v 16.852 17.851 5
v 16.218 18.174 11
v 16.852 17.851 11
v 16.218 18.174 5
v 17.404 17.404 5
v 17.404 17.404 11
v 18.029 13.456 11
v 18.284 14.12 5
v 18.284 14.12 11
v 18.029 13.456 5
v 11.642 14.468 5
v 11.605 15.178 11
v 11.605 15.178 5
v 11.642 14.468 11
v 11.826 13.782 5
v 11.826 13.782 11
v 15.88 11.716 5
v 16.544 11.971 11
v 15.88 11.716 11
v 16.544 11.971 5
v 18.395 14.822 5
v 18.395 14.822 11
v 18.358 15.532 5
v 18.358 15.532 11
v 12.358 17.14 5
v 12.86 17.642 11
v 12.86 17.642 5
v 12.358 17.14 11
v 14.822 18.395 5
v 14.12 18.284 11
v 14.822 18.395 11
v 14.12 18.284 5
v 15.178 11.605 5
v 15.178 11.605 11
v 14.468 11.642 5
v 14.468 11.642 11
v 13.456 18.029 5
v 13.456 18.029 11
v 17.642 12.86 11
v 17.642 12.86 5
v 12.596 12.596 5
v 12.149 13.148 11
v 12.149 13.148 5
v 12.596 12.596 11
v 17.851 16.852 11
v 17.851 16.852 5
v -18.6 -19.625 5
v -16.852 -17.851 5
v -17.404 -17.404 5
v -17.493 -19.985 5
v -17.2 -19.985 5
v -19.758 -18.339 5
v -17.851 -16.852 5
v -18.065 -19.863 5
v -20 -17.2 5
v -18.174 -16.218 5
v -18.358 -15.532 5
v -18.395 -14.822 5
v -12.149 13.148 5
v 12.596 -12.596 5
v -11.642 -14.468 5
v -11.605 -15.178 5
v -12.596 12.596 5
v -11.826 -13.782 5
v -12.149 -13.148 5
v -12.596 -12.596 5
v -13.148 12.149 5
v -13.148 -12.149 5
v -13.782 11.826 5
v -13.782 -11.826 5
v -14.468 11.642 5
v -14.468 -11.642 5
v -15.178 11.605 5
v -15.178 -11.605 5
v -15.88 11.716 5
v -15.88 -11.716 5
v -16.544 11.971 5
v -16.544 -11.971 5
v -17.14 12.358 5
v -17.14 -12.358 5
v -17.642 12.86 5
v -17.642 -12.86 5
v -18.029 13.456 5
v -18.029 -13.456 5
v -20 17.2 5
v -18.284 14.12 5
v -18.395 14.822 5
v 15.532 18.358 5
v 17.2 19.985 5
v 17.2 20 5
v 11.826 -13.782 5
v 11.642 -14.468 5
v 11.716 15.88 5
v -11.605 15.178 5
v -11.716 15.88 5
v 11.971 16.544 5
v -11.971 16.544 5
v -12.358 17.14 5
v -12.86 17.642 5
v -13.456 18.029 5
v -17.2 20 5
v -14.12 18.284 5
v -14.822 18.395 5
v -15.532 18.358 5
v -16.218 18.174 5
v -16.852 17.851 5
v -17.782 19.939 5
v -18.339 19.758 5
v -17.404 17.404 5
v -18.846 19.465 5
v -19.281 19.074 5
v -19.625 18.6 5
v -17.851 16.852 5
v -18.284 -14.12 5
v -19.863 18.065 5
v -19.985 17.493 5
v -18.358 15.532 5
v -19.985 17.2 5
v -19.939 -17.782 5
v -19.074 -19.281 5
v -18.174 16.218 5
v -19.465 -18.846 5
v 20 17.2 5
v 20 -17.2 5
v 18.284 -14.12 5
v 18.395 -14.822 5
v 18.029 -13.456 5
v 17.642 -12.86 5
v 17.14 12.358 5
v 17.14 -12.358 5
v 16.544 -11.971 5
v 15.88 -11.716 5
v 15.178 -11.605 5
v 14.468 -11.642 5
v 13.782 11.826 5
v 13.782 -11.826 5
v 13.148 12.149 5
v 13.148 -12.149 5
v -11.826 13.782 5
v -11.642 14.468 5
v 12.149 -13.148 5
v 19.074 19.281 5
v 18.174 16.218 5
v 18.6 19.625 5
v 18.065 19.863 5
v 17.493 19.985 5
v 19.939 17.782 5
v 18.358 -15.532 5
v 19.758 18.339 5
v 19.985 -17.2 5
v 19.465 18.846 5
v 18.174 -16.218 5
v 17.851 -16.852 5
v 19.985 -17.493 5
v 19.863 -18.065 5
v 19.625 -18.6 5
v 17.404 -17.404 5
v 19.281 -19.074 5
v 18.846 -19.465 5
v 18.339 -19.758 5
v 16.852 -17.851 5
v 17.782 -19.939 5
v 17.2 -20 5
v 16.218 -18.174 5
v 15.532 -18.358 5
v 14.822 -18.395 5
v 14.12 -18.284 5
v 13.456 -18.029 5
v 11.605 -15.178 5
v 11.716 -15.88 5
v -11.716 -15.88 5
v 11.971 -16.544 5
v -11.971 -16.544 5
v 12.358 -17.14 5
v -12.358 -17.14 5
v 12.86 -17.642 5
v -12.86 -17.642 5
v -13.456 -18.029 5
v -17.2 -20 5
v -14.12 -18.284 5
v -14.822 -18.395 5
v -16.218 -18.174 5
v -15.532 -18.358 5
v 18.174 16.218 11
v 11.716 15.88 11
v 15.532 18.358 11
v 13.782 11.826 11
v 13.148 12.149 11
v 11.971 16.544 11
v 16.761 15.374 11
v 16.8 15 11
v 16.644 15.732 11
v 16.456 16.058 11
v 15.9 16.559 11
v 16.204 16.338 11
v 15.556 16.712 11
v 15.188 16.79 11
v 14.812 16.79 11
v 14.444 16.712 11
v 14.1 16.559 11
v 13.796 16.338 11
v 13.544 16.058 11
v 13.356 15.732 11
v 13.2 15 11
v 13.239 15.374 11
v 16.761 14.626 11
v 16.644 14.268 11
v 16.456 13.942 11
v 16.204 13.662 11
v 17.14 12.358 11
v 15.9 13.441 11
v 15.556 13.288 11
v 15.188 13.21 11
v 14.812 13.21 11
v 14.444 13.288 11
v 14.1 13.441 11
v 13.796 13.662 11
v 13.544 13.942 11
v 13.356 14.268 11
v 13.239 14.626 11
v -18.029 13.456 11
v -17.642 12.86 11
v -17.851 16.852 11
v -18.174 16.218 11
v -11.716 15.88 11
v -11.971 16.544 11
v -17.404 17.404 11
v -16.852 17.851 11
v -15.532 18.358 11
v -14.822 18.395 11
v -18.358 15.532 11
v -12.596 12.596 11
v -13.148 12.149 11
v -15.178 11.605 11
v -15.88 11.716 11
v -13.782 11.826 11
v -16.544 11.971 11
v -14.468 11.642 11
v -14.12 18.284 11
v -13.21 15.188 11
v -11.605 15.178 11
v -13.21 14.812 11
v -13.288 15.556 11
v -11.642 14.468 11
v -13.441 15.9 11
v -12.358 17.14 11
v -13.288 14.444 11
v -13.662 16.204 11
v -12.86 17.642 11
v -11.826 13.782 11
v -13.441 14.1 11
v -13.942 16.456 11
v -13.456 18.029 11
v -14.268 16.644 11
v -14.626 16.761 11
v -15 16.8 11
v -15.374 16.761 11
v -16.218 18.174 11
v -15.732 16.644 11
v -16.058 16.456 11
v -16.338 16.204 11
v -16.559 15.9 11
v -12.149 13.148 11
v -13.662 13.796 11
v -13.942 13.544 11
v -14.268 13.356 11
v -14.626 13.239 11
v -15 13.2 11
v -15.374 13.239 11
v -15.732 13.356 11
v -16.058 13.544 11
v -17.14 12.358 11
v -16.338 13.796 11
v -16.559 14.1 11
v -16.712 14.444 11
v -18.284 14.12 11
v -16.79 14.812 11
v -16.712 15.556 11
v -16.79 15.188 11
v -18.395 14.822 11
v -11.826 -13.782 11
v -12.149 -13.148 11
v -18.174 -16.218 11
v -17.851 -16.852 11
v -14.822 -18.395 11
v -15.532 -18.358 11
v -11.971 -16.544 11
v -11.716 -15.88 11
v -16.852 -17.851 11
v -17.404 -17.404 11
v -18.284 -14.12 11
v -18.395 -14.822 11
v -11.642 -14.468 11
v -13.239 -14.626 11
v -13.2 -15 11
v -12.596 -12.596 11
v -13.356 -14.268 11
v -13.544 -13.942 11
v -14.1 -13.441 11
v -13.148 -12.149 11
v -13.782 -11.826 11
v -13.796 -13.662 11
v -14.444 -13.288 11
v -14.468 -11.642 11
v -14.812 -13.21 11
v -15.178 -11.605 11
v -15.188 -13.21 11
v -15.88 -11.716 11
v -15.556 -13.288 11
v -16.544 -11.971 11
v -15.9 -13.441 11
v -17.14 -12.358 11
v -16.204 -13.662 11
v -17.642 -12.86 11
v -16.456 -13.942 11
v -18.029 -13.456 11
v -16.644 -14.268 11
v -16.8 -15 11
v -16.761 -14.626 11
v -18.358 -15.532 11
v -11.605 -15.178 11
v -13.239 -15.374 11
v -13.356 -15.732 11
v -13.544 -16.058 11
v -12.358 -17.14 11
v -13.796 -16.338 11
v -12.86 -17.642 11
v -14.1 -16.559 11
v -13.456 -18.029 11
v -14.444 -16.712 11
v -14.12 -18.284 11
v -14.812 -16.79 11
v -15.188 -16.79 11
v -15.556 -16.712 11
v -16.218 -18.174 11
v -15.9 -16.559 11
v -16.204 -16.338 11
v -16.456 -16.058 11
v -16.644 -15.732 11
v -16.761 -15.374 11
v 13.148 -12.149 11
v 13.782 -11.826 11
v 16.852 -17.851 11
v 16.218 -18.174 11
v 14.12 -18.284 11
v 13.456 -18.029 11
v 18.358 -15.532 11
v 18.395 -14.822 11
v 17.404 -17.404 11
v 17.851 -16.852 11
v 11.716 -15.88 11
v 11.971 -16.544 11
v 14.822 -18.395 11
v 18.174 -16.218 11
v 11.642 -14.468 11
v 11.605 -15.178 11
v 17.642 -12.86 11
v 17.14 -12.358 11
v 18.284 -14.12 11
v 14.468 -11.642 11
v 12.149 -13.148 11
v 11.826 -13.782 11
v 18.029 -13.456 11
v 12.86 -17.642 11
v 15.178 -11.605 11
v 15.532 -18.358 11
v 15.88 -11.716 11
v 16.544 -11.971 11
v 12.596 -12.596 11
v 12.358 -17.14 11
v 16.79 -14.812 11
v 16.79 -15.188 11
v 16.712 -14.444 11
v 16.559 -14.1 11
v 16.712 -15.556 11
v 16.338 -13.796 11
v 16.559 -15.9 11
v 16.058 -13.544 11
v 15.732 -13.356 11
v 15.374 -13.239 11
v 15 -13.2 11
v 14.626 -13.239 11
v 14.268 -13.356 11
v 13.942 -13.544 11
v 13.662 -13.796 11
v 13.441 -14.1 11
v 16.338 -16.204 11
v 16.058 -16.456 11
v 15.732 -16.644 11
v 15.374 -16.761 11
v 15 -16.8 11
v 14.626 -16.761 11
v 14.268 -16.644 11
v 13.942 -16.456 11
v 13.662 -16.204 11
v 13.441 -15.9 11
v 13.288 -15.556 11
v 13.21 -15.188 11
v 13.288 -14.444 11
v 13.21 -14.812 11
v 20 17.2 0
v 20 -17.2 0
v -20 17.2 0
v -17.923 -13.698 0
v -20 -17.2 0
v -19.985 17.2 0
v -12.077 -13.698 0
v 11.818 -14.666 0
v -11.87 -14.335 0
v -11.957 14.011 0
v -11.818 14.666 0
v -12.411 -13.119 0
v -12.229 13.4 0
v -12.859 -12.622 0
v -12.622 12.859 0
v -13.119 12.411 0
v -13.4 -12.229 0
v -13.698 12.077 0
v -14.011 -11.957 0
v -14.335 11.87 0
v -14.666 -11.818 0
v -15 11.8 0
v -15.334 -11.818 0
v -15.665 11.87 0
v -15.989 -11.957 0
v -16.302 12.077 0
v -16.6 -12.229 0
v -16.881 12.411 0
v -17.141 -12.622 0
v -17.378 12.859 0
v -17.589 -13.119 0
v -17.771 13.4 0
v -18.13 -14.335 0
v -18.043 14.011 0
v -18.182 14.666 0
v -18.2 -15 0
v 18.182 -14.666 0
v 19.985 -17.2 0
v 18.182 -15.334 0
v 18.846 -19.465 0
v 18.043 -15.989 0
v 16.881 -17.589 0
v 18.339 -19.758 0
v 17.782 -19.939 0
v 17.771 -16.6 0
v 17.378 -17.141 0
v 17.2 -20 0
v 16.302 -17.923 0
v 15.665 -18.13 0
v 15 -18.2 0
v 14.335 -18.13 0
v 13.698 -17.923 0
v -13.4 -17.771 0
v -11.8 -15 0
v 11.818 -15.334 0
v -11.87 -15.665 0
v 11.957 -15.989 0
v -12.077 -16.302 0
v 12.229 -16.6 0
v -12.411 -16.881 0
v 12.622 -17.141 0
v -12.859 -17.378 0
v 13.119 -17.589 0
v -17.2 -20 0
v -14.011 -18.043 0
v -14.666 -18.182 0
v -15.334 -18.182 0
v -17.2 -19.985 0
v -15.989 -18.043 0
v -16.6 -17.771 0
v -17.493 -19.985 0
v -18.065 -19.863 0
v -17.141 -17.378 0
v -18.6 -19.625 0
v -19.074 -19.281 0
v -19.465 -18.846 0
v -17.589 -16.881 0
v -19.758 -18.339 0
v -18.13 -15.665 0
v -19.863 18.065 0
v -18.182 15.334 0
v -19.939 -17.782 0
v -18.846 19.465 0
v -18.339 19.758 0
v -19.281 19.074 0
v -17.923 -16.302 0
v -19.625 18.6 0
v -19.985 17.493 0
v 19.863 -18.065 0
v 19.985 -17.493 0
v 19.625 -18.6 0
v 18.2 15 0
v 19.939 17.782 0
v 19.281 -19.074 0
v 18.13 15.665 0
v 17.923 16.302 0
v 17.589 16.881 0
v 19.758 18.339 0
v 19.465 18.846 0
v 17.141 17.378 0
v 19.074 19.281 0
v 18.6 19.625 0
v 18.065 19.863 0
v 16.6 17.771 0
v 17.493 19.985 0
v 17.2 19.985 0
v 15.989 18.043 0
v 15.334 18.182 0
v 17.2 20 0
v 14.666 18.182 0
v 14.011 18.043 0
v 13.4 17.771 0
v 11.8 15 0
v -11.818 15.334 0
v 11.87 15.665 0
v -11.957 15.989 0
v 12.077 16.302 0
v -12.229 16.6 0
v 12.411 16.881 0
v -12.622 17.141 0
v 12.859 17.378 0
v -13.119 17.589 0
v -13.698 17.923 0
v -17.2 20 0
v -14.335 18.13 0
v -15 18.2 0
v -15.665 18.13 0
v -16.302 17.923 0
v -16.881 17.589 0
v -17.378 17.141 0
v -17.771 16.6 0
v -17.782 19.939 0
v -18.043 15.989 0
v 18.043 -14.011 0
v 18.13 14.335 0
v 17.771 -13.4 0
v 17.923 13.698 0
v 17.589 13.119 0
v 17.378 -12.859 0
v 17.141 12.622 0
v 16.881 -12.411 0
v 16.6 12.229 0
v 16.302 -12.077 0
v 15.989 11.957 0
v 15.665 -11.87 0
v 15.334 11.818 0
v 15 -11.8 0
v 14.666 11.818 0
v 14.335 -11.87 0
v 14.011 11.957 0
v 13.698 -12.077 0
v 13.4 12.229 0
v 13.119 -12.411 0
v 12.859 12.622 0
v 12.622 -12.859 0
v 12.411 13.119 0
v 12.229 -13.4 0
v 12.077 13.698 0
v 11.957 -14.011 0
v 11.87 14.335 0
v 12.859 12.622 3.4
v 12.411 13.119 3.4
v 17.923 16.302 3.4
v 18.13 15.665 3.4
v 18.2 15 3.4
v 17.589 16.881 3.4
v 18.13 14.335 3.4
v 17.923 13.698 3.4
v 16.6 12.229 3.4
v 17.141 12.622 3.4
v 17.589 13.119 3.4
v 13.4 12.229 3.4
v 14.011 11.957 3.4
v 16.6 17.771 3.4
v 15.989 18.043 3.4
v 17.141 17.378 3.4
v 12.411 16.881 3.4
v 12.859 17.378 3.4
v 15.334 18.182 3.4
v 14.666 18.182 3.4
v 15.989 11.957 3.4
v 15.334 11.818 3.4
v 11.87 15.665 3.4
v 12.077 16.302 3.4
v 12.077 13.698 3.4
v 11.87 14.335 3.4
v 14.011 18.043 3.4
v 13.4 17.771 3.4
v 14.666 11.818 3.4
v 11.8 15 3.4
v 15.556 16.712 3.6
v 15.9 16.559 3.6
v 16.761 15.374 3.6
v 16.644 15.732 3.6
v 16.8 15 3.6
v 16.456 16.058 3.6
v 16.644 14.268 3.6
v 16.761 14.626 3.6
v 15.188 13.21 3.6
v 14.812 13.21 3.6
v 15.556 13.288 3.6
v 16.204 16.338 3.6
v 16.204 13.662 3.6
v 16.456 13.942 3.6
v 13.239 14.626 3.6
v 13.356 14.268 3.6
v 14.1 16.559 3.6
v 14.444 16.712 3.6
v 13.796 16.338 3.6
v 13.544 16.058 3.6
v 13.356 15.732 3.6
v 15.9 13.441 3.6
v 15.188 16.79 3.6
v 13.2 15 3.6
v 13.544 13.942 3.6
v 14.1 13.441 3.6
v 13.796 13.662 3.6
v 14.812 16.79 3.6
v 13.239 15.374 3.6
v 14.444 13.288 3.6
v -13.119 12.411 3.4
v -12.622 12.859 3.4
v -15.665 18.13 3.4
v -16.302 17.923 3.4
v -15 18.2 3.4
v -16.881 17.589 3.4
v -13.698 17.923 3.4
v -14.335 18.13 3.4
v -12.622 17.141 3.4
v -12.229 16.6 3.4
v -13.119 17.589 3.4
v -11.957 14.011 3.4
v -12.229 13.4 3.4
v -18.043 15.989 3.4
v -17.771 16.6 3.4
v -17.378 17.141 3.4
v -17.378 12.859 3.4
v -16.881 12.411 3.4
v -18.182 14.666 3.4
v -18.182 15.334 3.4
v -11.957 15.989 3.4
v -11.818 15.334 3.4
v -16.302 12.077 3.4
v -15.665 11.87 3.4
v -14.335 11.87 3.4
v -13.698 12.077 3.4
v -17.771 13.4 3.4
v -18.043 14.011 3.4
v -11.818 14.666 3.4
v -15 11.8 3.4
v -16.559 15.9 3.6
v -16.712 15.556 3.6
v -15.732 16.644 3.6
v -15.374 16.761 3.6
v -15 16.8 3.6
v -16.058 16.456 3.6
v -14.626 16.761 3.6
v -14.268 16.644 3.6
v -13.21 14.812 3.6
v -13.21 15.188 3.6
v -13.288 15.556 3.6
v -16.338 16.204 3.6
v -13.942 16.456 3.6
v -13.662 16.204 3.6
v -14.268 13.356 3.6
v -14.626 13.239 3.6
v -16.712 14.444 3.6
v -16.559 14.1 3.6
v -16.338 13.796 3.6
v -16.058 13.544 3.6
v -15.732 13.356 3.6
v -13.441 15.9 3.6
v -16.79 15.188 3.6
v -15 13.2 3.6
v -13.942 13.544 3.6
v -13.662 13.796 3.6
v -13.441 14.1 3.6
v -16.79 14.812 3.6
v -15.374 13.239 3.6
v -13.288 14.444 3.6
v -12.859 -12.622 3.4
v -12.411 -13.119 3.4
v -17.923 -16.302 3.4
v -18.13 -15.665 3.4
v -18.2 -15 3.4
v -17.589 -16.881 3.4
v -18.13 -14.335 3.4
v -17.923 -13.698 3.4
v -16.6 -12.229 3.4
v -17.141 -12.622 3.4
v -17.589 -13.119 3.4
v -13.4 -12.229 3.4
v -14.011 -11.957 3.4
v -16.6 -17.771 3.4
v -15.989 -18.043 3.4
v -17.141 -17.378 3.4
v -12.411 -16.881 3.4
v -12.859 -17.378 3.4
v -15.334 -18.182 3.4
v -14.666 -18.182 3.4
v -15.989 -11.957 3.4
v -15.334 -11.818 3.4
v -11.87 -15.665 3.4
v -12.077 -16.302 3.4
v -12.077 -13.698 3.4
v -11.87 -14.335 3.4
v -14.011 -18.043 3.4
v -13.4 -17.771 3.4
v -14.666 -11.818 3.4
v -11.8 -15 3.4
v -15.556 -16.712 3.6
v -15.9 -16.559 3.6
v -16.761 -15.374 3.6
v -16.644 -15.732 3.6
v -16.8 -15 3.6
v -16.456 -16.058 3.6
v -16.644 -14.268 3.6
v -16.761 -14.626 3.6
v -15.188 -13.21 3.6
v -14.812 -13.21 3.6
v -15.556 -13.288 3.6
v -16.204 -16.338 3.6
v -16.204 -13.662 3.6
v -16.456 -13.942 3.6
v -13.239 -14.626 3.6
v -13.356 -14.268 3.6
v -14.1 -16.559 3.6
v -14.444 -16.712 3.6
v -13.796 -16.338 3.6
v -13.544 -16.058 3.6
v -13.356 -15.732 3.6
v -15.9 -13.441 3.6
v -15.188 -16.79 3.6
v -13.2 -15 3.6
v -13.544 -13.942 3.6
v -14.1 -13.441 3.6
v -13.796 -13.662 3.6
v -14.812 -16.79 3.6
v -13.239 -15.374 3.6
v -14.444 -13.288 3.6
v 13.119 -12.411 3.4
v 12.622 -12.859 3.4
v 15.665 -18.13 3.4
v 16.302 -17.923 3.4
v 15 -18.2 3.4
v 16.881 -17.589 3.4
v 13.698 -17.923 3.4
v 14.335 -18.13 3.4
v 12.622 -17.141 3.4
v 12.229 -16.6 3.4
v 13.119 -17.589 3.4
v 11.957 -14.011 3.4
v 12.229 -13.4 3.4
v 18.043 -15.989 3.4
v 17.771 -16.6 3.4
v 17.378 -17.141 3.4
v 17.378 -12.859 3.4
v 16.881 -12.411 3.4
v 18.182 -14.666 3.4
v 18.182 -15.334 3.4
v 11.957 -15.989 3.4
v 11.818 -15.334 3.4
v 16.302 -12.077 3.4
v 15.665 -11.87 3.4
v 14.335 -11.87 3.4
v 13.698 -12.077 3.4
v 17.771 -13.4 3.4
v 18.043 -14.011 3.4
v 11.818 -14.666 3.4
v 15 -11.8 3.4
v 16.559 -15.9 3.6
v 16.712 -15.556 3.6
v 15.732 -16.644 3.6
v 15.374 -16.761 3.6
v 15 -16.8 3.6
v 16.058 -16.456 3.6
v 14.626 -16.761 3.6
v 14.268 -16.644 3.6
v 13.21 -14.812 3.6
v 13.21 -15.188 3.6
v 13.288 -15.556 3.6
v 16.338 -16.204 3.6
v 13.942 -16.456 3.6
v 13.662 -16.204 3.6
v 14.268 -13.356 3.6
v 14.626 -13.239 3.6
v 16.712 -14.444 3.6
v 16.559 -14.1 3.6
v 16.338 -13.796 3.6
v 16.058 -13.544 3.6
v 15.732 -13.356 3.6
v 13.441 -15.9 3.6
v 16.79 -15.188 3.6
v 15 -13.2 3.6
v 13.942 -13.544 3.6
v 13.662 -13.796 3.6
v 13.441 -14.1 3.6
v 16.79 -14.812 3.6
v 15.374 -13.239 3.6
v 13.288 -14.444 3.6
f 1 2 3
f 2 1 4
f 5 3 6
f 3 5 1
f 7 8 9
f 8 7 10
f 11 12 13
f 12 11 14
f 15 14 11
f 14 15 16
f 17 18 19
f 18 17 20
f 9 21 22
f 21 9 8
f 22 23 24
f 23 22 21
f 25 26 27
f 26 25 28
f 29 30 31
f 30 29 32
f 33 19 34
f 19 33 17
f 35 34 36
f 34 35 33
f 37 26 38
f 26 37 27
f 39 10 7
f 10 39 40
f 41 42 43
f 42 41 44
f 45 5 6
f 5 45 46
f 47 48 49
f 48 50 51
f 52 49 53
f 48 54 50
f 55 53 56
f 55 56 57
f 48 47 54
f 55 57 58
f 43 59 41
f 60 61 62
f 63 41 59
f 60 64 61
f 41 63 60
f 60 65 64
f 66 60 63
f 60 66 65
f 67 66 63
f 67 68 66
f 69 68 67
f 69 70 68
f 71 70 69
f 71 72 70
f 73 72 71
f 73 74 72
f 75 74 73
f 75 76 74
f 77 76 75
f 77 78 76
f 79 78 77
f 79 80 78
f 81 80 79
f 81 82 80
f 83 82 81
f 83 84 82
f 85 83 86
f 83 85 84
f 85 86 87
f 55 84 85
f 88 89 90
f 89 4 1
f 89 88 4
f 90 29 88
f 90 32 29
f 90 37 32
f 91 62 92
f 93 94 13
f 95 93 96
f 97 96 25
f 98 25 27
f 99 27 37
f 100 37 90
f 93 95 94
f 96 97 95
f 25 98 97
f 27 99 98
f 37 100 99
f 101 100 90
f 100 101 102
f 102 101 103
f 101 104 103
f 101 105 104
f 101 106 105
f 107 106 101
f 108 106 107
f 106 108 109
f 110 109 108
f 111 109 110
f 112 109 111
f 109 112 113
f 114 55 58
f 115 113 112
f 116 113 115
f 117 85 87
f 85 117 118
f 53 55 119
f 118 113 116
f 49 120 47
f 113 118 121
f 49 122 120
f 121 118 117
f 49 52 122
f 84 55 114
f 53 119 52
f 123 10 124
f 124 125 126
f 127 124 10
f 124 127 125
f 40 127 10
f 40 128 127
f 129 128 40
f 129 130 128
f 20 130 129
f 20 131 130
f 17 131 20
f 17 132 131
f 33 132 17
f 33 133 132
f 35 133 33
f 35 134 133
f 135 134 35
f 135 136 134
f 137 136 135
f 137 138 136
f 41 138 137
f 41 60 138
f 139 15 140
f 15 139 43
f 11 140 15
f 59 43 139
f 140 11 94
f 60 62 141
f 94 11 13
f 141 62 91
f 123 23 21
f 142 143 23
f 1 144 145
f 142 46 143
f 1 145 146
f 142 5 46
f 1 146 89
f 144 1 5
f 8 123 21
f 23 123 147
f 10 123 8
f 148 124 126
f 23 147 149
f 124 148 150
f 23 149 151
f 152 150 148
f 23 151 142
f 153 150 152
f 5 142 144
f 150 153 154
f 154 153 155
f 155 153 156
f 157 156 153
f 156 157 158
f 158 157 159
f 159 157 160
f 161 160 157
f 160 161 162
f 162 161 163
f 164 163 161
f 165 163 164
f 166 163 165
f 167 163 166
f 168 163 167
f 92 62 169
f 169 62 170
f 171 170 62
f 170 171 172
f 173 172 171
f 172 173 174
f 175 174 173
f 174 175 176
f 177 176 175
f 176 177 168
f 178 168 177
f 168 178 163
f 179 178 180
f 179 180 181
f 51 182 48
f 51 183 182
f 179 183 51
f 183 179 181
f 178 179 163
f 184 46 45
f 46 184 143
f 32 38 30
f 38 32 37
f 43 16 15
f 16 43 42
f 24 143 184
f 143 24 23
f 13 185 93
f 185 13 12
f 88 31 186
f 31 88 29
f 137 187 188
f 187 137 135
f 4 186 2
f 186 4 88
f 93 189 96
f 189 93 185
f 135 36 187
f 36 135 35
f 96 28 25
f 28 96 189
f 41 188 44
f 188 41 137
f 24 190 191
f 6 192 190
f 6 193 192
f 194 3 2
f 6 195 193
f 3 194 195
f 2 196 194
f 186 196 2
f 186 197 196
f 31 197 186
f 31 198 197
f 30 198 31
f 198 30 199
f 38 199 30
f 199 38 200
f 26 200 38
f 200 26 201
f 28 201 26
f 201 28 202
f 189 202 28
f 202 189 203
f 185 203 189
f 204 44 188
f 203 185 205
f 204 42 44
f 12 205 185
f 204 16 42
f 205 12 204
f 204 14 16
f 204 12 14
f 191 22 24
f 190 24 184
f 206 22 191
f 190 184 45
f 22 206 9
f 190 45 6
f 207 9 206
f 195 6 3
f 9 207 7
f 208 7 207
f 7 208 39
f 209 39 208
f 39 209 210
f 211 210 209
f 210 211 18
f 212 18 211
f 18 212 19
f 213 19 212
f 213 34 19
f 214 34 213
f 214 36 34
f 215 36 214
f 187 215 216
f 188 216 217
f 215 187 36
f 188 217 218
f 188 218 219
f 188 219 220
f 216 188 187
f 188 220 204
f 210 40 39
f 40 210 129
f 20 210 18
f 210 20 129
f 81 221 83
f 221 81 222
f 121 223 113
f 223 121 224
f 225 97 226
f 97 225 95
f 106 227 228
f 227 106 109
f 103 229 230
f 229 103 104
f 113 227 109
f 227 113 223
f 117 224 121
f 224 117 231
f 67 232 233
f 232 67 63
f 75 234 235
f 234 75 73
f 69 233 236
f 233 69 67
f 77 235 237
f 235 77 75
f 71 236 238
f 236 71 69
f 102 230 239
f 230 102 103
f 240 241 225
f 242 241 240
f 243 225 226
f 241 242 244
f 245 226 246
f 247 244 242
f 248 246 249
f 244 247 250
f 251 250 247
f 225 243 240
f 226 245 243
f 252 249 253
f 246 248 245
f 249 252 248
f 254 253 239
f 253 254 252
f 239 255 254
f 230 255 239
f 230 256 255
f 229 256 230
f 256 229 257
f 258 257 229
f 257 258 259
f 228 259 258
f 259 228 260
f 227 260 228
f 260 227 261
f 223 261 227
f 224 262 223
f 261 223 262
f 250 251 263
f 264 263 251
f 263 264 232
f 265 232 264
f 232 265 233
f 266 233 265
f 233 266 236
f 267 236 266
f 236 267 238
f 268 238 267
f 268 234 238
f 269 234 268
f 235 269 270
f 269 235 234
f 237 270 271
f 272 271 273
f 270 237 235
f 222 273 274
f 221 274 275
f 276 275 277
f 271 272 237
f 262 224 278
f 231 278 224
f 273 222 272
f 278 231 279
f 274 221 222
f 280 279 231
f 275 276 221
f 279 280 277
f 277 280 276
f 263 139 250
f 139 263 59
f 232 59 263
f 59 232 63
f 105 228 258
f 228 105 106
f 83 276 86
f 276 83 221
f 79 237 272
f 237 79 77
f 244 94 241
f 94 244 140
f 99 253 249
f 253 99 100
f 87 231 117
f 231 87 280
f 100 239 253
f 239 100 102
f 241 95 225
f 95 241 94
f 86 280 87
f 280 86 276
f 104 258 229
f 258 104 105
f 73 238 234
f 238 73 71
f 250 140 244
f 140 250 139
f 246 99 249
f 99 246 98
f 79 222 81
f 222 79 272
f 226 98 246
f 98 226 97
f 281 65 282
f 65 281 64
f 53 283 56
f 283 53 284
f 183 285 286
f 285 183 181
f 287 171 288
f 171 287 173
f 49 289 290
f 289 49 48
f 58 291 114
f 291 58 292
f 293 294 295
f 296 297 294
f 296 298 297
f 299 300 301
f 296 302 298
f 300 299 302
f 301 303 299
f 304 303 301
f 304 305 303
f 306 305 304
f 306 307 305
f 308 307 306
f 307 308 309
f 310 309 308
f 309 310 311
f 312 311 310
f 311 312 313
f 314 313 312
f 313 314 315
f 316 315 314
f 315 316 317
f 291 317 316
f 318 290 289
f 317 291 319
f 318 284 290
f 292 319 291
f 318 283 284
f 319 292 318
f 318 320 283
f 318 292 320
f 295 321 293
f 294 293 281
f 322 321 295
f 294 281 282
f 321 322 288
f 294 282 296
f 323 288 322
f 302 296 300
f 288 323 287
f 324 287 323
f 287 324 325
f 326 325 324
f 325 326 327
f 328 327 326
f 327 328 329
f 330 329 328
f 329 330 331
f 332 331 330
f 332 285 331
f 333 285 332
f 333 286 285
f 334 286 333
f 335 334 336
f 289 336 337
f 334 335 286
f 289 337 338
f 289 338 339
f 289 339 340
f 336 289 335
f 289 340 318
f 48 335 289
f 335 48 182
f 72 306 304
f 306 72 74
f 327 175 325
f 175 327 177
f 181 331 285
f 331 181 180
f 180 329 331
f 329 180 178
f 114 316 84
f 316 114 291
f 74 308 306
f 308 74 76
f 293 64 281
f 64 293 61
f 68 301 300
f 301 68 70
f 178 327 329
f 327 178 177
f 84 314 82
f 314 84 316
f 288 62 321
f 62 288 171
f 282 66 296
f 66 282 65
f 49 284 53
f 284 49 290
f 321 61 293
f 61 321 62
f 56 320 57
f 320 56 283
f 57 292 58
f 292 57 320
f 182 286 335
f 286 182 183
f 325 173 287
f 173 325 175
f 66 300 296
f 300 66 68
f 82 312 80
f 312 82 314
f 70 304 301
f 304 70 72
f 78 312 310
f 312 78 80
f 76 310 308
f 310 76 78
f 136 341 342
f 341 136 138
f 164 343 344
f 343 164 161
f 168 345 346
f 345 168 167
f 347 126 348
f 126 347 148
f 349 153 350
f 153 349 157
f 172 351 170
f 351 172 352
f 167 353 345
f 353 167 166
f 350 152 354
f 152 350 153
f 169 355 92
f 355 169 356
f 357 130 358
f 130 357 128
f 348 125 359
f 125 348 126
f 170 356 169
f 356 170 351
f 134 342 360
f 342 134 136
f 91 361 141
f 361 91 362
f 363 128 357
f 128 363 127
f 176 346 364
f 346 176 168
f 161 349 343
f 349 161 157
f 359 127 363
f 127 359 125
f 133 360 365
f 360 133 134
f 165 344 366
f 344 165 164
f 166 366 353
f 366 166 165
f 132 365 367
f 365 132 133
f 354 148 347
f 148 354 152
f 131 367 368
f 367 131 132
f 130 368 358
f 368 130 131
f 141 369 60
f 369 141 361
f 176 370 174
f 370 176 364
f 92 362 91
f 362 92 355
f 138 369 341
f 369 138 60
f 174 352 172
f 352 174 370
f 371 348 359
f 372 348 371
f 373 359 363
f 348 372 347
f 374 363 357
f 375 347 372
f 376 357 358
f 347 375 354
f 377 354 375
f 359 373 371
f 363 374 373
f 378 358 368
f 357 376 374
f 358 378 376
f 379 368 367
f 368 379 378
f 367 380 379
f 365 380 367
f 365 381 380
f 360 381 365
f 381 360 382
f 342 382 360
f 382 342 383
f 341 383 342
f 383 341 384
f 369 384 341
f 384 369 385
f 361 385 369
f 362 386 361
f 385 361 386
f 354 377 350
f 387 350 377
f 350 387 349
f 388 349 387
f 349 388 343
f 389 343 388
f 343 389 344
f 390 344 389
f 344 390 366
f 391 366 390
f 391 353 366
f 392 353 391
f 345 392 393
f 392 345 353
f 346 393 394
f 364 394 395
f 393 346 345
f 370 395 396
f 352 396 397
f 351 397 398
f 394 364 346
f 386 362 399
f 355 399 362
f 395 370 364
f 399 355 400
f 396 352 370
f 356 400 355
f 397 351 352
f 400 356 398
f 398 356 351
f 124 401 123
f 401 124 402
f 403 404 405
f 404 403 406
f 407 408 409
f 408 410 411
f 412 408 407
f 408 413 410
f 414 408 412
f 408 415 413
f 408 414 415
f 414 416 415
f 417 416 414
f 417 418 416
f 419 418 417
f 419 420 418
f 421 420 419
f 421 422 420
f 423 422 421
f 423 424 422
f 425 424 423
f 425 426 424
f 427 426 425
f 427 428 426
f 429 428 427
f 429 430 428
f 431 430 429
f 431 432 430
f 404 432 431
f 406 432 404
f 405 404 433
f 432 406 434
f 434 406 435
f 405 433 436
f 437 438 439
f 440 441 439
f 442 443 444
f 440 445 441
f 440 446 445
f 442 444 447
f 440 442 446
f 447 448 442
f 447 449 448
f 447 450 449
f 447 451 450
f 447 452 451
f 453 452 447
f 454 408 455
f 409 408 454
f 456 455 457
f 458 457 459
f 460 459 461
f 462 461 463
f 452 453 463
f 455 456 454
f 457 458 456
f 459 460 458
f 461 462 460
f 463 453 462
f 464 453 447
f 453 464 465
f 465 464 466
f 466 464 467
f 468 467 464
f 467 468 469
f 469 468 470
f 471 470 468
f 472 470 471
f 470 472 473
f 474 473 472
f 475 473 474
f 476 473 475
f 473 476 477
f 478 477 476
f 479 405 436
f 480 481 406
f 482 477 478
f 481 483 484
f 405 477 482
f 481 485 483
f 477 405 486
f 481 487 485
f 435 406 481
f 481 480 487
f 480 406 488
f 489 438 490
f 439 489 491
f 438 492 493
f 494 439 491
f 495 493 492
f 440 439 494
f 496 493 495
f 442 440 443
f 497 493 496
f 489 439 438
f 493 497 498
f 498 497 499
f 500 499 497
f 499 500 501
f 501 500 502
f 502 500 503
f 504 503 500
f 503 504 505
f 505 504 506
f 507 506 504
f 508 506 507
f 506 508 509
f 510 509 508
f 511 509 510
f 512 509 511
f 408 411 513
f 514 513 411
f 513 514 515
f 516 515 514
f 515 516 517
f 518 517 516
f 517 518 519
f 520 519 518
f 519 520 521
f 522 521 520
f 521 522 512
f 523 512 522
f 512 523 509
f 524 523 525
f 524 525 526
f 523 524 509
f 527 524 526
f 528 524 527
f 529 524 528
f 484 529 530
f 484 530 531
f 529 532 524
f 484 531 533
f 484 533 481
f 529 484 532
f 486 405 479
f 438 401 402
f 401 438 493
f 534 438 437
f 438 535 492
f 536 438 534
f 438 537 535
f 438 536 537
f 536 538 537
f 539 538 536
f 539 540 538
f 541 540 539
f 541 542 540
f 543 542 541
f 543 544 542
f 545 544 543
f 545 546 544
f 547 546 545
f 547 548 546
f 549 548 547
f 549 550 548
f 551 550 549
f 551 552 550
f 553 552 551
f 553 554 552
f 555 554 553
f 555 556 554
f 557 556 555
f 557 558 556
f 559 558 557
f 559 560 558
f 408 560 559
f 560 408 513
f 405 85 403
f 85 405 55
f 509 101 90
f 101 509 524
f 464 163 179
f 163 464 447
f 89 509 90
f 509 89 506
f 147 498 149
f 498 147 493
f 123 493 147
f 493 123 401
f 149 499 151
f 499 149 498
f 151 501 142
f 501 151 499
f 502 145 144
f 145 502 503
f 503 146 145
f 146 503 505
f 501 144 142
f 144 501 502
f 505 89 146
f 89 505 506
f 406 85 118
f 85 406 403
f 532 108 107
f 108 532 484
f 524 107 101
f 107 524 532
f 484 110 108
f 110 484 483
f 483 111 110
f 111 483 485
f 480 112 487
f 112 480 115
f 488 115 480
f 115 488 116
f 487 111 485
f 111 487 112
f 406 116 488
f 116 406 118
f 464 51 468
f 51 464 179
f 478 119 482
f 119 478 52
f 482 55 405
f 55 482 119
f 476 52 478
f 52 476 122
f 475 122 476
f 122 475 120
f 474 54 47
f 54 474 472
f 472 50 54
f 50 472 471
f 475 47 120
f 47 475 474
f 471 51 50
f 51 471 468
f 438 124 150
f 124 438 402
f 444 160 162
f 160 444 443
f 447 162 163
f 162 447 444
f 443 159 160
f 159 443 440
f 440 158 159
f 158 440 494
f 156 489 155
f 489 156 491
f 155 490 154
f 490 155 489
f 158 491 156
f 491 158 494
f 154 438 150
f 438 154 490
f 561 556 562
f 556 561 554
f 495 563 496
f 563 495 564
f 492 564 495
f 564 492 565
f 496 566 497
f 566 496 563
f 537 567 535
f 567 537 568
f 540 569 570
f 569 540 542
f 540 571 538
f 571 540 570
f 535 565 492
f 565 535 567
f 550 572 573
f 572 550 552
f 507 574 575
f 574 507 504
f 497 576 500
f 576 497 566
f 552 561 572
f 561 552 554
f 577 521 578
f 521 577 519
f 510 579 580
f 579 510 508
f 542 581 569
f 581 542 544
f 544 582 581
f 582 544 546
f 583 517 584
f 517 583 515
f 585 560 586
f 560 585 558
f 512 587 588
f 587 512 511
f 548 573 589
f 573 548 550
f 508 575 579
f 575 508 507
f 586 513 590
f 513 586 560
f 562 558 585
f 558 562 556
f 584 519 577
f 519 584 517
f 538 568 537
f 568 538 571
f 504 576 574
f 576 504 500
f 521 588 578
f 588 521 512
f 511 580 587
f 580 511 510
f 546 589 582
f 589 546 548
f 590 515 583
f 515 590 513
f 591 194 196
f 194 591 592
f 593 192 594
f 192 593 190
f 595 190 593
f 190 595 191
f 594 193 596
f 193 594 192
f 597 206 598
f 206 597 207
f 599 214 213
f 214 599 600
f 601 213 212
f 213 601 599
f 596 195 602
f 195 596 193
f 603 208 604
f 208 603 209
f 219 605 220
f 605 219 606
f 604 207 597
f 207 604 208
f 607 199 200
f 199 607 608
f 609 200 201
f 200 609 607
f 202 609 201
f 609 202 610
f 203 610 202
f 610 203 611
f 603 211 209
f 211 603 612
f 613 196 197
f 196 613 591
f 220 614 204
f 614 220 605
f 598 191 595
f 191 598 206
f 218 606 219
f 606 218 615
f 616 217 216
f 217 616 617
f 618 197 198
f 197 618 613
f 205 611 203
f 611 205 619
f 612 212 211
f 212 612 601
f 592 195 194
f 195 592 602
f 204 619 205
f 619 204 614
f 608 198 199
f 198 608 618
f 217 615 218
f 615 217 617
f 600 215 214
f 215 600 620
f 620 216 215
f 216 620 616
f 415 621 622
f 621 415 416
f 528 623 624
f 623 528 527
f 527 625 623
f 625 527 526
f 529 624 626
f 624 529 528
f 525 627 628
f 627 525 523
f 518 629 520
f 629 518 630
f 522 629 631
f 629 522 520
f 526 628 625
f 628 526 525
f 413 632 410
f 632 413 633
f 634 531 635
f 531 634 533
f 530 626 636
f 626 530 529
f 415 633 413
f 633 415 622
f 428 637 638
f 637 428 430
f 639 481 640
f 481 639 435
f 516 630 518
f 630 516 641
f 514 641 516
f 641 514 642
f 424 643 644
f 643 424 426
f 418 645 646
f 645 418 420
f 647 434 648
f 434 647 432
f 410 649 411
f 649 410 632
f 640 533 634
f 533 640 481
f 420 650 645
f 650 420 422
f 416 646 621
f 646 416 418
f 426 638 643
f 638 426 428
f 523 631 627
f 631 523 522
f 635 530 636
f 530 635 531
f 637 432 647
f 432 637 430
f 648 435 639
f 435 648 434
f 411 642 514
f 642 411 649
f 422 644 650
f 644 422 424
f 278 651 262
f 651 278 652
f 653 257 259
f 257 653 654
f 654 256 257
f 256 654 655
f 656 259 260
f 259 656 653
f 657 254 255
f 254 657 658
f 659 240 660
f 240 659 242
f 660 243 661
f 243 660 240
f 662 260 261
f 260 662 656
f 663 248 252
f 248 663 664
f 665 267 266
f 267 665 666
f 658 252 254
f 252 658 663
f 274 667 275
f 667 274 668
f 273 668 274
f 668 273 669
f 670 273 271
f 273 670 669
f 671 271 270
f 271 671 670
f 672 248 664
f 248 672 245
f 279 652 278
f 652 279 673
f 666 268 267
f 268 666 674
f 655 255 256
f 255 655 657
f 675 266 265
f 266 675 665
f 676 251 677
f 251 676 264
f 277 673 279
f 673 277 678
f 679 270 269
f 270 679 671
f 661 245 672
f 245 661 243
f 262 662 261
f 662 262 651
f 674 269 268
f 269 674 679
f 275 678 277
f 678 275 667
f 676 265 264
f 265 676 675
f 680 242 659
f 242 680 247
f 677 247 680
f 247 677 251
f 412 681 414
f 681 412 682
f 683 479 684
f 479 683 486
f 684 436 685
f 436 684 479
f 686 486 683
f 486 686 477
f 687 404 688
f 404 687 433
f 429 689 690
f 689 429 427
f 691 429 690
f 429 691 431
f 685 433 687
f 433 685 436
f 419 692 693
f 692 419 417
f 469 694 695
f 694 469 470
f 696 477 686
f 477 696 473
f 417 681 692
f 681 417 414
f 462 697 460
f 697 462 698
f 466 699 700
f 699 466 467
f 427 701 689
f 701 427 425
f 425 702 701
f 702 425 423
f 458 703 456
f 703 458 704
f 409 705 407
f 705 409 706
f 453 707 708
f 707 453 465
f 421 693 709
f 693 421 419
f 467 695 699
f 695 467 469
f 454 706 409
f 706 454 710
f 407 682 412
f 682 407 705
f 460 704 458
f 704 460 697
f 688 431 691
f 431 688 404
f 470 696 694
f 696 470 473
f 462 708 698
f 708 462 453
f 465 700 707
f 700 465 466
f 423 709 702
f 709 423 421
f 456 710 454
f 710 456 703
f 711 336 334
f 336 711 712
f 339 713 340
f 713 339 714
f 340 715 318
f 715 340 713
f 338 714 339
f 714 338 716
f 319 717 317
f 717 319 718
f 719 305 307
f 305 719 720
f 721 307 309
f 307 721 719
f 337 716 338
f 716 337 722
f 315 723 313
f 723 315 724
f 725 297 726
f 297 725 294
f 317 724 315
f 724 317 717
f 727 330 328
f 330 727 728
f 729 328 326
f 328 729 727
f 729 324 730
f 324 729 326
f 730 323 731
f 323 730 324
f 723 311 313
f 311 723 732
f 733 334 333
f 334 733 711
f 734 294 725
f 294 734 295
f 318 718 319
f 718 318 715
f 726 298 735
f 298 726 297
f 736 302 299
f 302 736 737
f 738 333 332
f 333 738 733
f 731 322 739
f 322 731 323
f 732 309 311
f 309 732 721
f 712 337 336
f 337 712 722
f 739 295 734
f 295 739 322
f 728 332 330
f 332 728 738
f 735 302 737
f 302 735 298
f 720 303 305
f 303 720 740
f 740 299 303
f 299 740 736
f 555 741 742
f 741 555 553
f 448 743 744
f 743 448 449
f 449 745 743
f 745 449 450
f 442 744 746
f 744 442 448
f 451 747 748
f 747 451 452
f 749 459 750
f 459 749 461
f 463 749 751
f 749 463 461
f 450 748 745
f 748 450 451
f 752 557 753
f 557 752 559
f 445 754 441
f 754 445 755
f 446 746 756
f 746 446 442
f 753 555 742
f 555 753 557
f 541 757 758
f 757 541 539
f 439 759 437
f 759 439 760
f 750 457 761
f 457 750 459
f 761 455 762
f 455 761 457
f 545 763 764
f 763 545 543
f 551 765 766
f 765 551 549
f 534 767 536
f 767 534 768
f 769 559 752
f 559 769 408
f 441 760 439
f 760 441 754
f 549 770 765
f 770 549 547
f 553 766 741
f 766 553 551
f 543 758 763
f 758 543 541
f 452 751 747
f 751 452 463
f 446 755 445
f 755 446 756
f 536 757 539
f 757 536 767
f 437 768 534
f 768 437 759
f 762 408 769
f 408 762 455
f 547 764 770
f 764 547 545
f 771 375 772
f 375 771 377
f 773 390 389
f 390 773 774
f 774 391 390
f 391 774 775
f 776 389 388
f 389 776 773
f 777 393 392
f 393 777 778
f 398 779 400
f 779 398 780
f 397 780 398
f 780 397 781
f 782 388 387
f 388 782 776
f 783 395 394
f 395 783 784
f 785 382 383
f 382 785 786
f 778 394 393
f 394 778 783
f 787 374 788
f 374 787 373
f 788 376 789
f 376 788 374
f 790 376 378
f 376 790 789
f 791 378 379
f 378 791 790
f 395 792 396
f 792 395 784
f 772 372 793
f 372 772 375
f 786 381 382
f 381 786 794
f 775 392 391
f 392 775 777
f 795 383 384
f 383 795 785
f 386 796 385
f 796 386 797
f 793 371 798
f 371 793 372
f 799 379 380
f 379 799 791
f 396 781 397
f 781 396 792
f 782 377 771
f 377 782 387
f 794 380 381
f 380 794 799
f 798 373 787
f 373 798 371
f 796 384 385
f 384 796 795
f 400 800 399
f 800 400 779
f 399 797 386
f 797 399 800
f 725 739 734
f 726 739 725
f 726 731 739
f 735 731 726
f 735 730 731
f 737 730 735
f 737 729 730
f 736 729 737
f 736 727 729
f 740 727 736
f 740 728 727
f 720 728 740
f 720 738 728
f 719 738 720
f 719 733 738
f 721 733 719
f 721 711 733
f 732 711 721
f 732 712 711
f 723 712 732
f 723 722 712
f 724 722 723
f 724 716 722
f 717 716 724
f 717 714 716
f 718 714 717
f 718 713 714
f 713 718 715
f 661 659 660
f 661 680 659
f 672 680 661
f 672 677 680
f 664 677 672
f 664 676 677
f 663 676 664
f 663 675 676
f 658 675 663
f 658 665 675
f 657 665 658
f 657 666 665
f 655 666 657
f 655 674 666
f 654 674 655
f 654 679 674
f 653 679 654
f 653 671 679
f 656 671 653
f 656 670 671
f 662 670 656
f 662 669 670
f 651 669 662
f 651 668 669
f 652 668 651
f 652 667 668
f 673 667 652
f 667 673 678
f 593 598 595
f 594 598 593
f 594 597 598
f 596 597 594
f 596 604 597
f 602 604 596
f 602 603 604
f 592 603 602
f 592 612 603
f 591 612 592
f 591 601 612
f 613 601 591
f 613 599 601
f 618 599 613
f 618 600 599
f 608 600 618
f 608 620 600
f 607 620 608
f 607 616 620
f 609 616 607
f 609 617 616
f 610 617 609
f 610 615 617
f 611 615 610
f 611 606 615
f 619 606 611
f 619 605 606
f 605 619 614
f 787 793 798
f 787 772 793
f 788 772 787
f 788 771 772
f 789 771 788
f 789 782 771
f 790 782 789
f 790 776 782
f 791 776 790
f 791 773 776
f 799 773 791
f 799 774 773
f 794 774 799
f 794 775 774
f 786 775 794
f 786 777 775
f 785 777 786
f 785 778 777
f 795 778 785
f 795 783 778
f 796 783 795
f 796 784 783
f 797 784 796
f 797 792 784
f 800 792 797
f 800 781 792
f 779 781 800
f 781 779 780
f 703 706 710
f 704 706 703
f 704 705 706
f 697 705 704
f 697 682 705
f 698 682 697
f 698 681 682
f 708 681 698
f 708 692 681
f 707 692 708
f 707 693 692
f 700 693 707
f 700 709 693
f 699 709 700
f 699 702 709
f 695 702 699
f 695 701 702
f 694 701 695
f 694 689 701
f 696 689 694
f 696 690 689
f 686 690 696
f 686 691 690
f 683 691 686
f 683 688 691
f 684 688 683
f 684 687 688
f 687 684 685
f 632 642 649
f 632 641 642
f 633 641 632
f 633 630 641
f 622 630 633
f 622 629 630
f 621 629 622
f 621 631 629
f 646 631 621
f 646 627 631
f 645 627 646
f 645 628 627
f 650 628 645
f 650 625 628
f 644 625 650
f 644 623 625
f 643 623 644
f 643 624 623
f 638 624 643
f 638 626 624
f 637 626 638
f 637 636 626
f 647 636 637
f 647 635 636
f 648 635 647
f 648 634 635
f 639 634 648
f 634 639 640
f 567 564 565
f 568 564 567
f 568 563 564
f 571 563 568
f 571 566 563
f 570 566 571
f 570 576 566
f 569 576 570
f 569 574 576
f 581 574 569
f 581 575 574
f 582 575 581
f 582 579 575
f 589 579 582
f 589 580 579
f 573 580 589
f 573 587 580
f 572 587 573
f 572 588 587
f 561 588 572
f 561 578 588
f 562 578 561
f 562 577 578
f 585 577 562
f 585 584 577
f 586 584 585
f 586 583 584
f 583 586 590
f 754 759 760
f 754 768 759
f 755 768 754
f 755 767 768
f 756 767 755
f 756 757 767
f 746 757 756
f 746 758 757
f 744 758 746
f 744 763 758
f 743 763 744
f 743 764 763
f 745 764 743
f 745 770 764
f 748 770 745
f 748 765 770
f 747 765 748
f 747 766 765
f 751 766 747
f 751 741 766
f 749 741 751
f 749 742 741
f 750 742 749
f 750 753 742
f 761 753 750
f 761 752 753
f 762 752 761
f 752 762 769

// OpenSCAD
$fn = 30;



bottomHeight = 5;
bottomClearance = 6;
screwDiameter = 3;
layerHeight = 0.2;
screwsSpacing = 30;
bottomWidth = 40;


module roundCornerMask( d, height ) {
 difference() {
   translate( [0, 0, 0] ) cube( [d, d, height] );
   translate( [0, 0, -1] ) cylinder( r=d/2, h=height+2 );
 };
};

module screwM3Hole( length ) {
 union() {  // Screw head : 5.6x3
   cylinder( r=(5.6/2)+0.4, h=3+0.5+1 ); // h = diameter+clerance+avoid OpenSCAD difference on same surface
   cylinder( r=(3/2)+0.3, h=length+3+0.5+1 );
 };
};


module screwM3HoleNut( length ) {
 union() {  // Screw head : 5.6x3
   cylinder( r=5.5/sqrt(3)*2/2+0.2, h=3+0.5+1, $fn=6); // h = diameter+clearance+avoid OpenSCAD difference on same surface
   cylinder( r=(3/2)+0.3, h=length+3+0.5+1 );
 };
};


// bottom();
// translate( [50, 0, 0 ] ) top();

module base() {
 difference() {
   union() {
     translate( [0, 0, bottomHeight/2] )	// Base
       cube( [bottomWidth, bottomWidth, bottomHeight], center=true );
	  for( i = [45, 135, 225, 315] ) {  // Supports
		  rotate( [0, 0, i] )  
		  translate ( [screwsSpacing*sqrt(2)/2, 0, bottomHeight] ) cylinder( r=3.4, h=bottomClearance );
	  };
   };
	// Round corners
   for( i = [45, 135, 225, 315] ) {
	  rotate( [0,0,i] )  
	  translate ( [(bottomWidth-5.6)*sqrt(2)/2,0,-1] ) 
	  rotate( [0,0,-45] ) roundCornerMask( 5.6, bottomHeight+2 );
	};
 };
};

module bottom() {
 union() {
   difference() {
     base();
     for( i = [45, 135, 225, 315] ) {
       rotate( [0,0,i] )  
       translate ( [screwsSpacing*sqrt(2)/2,0,-1] ) 
		rotate( [0,0,-45] ) screwM3Hole( 40 );
     };
   };
	// Creates a bridge for one layer to help printing
	translate( [0,0,3+0.5] )
	  cube( [bottomWidth-5.6/2, bottomWidth-5.6/2 ,layerHeight], center=true );
 };
};

module top() {
 union() {
   difference() {
     base();
     for( i = [45, 135, 225, 315] ) {
       rotate( [0,0,i] )  
       translate ( [screwsSpacing*sqrt(2)/2,0,-1] ) 
		rotate( [0,0,-45] ) screwM3HoleNut( 40 );
     };
   };
	// Creates a bridge for one layer to help printing
	translate( [0,0,3+0.5] )
	  cube( [bottomWidth-5.6/2, bottomWidth-5.6/2 ,layerHeight], center=true );
 };
};

bottom();
//ntranslate( [50, 0 ,0] ) top();
//rotate( [180,0,0] ) translate( [0,0,-(bottomClearance+bottomHeight)*2-1.6] ) top();
